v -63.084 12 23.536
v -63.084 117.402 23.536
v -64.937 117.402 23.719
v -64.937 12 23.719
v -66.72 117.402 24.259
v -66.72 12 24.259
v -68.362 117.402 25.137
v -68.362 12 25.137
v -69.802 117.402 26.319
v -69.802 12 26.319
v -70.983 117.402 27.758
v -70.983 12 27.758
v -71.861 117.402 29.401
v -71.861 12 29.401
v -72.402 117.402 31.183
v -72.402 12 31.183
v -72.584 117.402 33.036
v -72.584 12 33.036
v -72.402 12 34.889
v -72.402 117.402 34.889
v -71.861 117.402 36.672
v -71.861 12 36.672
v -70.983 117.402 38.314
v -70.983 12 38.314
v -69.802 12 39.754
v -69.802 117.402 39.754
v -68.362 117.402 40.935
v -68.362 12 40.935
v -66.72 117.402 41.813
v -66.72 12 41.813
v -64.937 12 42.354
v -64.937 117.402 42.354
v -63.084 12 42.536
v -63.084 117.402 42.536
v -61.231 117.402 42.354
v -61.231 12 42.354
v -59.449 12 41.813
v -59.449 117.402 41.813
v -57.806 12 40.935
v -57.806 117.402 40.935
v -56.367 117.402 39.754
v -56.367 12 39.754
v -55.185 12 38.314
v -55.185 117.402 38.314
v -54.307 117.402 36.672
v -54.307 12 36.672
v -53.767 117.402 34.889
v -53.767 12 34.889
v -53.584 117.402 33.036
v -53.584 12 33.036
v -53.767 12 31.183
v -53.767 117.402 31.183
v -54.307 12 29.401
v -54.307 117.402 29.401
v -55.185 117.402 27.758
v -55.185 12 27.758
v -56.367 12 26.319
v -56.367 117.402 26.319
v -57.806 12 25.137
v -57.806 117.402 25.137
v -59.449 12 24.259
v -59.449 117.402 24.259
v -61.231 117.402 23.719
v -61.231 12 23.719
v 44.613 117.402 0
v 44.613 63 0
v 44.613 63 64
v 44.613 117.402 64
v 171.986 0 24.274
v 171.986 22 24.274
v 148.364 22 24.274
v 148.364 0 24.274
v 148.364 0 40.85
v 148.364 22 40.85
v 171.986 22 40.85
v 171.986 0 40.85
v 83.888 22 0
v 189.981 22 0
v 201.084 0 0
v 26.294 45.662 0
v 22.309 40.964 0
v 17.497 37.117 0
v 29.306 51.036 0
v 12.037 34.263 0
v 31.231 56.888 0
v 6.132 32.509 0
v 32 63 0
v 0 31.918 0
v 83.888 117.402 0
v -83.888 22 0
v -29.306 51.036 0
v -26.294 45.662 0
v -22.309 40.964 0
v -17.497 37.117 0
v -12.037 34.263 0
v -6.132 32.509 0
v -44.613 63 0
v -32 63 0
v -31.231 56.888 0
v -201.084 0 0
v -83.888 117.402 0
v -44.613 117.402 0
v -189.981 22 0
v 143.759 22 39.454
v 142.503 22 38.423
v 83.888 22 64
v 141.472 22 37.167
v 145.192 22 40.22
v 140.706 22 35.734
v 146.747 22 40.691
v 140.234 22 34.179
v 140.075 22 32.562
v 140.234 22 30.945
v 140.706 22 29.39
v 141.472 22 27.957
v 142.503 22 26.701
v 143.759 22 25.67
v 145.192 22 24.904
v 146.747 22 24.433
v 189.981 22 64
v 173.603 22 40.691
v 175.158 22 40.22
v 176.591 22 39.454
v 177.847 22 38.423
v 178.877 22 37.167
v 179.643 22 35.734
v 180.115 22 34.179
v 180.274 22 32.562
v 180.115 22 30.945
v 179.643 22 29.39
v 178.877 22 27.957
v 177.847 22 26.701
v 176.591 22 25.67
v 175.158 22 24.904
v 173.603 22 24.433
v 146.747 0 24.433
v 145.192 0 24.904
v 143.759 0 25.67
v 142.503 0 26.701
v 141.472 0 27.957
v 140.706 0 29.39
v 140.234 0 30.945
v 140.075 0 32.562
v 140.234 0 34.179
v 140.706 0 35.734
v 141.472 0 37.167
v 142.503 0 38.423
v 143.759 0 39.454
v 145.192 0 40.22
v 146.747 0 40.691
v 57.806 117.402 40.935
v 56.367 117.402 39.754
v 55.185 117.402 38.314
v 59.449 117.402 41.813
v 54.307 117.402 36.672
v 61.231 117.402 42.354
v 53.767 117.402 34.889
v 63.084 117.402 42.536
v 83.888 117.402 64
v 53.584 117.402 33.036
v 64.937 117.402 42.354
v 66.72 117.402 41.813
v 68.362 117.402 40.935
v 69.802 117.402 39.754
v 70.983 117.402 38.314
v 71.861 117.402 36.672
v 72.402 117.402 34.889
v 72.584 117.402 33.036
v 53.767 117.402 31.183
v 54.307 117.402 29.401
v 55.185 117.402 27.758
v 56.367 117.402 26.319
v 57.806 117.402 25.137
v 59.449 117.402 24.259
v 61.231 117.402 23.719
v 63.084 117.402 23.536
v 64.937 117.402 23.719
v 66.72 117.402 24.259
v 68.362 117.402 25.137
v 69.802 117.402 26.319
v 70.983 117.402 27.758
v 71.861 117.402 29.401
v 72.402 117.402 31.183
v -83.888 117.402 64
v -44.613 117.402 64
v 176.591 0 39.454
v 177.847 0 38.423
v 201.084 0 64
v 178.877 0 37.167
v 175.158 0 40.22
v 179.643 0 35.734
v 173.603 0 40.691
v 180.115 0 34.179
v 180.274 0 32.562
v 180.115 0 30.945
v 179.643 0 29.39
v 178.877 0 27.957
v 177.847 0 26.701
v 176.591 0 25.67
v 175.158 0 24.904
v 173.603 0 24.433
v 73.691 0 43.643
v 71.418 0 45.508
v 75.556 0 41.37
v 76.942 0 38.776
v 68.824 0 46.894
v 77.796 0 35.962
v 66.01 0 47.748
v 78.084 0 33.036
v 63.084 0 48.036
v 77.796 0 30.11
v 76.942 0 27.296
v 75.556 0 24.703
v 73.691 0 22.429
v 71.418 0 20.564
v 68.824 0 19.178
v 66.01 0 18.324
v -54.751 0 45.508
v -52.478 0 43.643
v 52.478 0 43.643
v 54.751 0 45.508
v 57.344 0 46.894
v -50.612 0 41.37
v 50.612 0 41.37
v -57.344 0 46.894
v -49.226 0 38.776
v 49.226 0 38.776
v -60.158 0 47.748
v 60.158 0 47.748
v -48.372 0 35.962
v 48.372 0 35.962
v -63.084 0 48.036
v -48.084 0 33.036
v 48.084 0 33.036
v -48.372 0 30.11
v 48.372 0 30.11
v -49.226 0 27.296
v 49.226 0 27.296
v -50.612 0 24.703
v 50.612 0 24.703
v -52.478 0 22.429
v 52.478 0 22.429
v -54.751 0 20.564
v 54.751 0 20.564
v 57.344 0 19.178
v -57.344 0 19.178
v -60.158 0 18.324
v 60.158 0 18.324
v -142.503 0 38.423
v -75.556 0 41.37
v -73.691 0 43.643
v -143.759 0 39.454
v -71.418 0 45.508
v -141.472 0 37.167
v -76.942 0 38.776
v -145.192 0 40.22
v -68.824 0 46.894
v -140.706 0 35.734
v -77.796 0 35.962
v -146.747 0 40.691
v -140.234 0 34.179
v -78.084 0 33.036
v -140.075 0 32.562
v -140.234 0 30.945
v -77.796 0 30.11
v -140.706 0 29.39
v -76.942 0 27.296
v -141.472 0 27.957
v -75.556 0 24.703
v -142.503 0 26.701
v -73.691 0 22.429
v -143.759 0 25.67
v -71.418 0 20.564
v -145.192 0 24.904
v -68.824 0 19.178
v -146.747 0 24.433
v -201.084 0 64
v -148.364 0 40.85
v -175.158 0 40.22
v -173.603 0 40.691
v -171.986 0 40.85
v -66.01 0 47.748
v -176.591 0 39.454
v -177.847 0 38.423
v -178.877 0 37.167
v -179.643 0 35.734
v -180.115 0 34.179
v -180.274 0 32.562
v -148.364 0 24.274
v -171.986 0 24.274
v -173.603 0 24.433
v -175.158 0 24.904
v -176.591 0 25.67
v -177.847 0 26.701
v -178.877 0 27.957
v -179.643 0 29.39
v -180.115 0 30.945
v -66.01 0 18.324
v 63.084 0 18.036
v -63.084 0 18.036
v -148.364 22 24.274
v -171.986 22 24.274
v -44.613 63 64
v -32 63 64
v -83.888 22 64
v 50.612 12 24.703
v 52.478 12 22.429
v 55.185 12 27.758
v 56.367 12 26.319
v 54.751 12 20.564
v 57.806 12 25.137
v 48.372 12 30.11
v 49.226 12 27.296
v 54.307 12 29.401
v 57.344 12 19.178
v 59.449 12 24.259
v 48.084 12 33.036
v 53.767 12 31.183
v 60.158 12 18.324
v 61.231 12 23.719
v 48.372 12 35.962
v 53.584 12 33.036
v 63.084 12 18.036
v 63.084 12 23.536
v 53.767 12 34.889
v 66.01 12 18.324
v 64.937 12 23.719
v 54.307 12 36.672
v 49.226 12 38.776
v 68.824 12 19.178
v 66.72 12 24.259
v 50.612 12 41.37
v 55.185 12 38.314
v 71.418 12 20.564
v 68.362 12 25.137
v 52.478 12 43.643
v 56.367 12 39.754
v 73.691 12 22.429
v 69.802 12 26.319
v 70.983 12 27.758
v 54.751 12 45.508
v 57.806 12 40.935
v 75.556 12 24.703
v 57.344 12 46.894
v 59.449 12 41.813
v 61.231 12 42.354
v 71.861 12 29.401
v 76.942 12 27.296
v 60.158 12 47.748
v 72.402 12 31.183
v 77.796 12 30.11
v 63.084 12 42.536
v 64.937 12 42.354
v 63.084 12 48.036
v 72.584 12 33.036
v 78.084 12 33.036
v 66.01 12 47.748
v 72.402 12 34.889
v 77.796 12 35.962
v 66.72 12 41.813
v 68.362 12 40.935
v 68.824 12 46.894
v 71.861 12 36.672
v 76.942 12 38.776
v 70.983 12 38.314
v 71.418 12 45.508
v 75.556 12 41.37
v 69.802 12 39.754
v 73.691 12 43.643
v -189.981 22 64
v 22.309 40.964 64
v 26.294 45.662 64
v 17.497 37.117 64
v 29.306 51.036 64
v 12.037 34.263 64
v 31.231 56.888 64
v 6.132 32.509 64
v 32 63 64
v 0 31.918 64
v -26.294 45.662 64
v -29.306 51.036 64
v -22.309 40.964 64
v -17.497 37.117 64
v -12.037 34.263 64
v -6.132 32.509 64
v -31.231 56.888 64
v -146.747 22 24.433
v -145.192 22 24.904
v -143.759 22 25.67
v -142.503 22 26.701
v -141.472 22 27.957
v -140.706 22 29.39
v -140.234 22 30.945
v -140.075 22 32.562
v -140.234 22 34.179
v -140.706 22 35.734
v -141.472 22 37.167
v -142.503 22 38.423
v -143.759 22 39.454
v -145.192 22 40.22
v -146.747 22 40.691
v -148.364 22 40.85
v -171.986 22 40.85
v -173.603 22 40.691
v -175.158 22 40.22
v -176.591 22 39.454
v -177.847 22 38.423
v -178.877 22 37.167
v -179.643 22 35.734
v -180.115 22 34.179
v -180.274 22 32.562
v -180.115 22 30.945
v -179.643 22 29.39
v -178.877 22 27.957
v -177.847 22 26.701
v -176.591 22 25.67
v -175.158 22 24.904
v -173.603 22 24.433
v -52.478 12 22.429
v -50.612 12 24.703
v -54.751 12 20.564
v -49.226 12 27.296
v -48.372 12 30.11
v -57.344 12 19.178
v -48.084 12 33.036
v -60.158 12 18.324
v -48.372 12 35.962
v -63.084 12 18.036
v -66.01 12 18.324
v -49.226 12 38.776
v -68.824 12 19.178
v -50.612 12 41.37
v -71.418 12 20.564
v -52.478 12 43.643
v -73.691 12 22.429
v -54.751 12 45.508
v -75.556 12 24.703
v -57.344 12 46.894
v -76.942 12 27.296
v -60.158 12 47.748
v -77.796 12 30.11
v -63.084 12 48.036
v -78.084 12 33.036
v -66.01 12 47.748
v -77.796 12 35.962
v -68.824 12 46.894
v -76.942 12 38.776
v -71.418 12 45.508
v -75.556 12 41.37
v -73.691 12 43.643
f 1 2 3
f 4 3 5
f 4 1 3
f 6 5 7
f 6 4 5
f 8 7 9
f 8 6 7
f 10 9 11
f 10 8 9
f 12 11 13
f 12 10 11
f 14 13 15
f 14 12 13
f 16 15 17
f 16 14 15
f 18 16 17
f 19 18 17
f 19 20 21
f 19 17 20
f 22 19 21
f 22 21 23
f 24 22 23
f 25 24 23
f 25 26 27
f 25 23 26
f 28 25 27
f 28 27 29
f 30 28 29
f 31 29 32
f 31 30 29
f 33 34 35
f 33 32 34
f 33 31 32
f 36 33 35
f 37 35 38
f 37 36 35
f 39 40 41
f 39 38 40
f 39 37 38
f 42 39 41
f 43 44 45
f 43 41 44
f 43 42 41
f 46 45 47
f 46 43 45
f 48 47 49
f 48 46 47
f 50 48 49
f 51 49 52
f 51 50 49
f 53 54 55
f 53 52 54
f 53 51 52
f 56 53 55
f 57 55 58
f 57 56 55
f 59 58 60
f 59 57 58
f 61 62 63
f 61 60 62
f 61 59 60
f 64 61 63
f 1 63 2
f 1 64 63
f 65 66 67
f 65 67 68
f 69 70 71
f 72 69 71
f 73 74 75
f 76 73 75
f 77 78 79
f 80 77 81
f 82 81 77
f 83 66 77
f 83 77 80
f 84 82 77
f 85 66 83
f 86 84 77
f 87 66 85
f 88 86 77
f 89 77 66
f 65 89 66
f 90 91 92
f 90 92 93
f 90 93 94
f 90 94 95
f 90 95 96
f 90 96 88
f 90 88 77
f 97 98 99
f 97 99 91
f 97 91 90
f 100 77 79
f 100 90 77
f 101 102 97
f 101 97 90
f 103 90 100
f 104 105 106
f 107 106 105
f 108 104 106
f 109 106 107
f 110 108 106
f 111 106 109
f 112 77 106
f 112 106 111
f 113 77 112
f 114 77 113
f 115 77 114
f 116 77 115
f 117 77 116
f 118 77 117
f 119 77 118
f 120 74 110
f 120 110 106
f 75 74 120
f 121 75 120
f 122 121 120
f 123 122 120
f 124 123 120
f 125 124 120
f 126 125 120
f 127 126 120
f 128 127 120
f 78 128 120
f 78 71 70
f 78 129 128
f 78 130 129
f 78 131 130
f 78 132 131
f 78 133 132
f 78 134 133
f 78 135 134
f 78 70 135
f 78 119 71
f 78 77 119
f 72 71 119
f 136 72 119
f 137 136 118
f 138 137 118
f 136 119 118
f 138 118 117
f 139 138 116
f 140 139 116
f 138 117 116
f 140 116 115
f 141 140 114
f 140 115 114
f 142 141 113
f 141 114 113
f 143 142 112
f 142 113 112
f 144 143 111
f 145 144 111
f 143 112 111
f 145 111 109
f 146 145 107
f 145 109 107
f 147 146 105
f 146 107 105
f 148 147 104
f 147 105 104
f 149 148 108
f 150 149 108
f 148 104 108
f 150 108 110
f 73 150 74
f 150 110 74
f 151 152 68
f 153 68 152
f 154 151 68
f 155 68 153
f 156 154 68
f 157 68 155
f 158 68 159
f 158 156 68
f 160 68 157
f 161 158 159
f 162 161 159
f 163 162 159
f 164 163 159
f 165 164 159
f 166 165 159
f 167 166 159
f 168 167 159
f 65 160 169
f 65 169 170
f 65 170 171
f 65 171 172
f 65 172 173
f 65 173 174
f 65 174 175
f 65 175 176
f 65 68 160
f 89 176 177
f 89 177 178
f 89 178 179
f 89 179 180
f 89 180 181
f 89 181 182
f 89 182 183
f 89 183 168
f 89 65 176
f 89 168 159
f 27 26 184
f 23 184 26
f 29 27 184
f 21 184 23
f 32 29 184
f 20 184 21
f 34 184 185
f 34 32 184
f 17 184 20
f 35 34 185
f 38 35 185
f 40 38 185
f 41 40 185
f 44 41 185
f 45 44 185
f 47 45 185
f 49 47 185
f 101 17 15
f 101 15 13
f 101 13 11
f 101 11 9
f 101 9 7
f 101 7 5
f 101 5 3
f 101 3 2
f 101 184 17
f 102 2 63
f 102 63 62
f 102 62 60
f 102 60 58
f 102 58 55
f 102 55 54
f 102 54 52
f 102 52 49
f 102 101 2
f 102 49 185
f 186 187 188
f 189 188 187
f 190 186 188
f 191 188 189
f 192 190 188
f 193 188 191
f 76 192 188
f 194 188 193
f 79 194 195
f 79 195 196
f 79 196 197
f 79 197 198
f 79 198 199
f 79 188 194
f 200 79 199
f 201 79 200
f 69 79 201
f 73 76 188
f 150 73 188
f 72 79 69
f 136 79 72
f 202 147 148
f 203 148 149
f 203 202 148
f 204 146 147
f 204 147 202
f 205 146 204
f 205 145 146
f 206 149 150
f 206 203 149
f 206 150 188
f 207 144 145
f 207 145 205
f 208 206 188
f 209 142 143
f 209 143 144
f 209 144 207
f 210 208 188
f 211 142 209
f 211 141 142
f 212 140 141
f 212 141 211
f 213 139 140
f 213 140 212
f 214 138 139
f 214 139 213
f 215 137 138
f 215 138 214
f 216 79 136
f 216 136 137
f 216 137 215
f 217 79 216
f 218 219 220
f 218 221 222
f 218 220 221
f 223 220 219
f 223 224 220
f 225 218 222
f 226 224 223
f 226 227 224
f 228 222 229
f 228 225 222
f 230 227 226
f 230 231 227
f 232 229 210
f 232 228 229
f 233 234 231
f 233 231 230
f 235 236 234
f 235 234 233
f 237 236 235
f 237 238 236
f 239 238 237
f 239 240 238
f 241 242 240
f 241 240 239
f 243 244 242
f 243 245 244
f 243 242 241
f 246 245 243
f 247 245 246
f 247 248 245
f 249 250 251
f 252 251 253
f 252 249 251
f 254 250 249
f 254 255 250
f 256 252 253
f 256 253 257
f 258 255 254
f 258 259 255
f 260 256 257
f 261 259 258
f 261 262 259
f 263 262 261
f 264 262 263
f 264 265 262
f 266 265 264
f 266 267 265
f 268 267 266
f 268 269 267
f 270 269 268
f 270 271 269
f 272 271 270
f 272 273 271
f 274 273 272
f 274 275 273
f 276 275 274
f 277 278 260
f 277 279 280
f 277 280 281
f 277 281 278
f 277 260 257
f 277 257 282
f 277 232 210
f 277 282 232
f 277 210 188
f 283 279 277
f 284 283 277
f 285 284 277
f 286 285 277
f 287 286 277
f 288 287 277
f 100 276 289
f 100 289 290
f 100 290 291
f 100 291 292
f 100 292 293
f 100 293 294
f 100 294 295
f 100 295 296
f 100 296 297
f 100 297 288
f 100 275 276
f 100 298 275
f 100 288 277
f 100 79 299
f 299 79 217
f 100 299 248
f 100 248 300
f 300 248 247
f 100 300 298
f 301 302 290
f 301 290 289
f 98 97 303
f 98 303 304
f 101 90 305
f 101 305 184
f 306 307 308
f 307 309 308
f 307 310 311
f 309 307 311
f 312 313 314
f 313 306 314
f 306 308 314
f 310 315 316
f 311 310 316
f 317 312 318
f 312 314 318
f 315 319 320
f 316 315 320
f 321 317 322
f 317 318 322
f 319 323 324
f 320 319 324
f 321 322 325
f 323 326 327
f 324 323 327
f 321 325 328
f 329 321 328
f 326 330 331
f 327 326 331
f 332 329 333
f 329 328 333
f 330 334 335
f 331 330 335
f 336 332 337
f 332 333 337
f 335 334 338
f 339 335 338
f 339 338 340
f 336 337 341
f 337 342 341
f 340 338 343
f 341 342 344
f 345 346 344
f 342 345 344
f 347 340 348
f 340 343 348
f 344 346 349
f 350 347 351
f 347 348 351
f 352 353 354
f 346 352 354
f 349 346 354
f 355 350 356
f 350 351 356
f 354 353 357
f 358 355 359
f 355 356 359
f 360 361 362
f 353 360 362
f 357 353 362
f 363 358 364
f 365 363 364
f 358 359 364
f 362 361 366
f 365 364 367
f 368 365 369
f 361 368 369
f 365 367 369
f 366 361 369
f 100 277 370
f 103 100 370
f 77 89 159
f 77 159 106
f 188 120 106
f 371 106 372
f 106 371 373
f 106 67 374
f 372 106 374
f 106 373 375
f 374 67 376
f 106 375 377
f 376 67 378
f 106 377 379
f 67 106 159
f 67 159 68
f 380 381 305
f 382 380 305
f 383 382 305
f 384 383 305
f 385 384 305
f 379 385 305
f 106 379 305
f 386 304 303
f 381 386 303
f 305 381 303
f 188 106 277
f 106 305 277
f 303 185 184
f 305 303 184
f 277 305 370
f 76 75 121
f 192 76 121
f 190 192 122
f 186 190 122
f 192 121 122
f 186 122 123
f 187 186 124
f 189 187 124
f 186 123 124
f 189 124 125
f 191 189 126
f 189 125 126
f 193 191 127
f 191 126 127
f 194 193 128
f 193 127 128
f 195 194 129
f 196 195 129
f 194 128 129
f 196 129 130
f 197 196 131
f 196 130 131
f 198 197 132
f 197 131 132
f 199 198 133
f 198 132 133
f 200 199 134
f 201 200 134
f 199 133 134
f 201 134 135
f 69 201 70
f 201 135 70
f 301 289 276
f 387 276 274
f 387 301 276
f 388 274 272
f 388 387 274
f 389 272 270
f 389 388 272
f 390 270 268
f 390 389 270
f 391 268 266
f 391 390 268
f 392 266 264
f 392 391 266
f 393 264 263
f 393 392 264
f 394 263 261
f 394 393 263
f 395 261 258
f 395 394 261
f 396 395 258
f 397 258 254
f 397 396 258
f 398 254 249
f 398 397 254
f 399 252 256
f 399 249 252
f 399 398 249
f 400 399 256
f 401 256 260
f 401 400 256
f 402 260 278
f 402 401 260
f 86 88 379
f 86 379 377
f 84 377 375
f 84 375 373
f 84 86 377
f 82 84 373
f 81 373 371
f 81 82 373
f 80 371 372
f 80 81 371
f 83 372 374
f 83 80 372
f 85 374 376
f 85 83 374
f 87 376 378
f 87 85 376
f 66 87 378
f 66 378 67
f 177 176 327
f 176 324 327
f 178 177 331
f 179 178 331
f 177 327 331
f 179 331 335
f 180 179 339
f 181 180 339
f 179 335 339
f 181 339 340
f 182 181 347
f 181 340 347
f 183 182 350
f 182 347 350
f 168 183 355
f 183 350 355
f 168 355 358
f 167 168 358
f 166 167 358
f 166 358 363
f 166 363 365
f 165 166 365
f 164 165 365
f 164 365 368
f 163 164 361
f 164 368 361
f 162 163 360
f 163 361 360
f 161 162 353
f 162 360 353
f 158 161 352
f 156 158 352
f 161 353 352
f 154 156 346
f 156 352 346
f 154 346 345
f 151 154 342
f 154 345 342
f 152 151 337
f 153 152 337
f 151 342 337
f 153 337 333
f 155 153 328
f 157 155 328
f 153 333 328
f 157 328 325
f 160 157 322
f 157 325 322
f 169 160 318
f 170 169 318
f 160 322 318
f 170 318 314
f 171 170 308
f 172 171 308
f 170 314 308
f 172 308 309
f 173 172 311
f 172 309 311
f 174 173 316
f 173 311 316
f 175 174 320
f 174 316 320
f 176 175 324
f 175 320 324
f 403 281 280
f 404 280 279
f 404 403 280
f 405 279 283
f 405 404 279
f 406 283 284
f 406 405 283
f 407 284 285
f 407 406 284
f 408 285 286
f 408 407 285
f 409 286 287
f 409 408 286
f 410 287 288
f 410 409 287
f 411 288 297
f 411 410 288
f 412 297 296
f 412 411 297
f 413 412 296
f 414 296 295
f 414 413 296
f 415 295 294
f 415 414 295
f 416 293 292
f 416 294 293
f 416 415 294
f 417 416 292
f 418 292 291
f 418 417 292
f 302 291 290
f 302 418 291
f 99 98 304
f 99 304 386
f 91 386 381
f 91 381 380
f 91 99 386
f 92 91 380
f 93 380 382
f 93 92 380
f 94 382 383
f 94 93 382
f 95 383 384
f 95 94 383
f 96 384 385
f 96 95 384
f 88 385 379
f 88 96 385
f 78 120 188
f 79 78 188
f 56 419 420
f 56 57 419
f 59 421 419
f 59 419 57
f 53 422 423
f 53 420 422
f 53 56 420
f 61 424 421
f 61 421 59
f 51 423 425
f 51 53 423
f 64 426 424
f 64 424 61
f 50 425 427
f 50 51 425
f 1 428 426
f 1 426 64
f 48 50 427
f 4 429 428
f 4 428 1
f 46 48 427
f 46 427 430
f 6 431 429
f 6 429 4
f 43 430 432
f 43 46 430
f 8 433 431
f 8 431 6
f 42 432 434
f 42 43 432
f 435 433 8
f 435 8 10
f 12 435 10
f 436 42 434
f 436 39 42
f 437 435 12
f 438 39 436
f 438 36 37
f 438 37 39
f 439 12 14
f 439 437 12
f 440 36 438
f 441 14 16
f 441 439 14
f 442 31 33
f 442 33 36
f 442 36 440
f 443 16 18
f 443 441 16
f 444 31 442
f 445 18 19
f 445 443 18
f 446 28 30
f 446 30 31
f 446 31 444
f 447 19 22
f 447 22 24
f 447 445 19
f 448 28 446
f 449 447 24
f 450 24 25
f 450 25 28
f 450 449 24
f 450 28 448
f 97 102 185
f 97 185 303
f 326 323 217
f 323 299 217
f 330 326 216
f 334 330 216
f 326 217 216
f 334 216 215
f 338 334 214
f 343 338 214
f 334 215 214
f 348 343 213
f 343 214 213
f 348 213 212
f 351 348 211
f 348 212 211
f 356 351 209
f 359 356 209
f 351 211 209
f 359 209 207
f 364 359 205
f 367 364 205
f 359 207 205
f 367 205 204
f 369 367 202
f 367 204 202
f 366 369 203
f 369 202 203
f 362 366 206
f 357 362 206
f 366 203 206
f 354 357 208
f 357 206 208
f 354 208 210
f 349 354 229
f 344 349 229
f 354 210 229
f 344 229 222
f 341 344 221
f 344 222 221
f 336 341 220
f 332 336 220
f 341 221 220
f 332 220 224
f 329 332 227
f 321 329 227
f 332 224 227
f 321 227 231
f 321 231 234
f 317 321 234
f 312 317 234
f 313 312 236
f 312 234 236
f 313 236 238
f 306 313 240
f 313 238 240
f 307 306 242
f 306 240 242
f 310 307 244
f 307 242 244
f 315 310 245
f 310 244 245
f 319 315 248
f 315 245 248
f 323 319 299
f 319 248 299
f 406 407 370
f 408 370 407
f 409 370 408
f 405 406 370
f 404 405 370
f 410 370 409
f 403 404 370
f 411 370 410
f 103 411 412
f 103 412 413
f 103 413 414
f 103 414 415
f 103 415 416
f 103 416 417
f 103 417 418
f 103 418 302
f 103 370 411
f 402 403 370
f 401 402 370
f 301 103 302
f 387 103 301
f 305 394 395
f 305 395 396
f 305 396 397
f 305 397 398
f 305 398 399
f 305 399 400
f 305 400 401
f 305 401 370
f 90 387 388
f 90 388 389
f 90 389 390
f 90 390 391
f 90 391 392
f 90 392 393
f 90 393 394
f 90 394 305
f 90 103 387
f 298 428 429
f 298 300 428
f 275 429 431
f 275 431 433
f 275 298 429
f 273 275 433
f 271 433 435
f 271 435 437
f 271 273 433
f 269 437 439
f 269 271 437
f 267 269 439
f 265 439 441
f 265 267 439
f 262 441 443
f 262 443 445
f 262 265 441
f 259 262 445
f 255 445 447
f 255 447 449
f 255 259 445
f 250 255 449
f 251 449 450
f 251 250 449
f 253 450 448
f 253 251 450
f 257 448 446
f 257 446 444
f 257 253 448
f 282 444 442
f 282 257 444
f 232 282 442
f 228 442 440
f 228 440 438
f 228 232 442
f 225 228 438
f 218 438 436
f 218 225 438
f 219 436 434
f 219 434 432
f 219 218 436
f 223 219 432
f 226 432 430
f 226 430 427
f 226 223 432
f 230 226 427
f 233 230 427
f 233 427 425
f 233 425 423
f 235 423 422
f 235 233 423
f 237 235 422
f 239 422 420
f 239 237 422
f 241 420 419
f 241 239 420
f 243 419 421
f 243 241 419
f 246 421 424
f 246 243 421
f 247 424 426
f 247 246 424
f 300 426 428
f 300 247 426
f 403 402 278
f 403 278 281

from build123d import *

# Parameters (mm, degrees)
BOSS_EXTRUDE1_DEPTH = 64
CUT_EXTRUDE1_DEPTH  = 64


with BuildPart() as part:
    # Sketch1 → Boss-Extrude1 (new body)
    with BuildSketch(Plane.XY):
        with BuildLine():
            Line((-201.08411215, 0), (-189.981308411, 22))
            Line((-189.981308411, 22), (-83.887850467, 22))
            Line((-83.887850467, 22), (-83.887850467, 117.401869159))
            Line((-83.887850467, 117.401869159), (-44.613332129, 117.401869159))
            Line((-44.613332129, 117.401869159), (-44.613332129, 63))
            Line((-44.613332129, 63), (-32, 63))
            ThreePointArc((-32, 63), (-22.308799202, 40.963993281), (0, 31.918417389))
            ThreePointArc((0, 31.918417389), (22.308799202, 40.963993281), (32, 63))
            Line((32, 63), (44.613332129, 63))
            Line((44.613332129, 63), (44.613332129, 117.401869159))
            Line((44.613332129, 117.401869159), (83.887850467, 117.401869159))
            Line((83.887850467, 117.401869159), (83.887850467, 22))
            Line((83.887850467, 22), (189.981308411, 22))
            Line((189.981308411, 22), (201.08411215, 0))
            Line((201.08411215, 0), (-201.08411215, 0))
        make_face()
    extrude(amount=BOSS_EXTRUDE1_DEPTH)

    # Sketch2 → Cut-Extrude1 (cut)
    with BuildSketch(Plane(origin=(0, 22, 0), x_dir=(1, 0, 0), z_dir=(0, 1, 0))):
        with BuildLine():
            Line((-171.985857657, -24.273514292), (-148.363703714, -24.273514292))
            ThreePointArc((-148.363703714, -24.273514292), (-140.075228646, -32.56198936), (-148.363703714, -40.850464428))
            Line((-148.363703714, -40.850464428), (-171.985857657, -40.850464428))
            ThreePointArc((-171.985857657, -40.850464428), (-180.274332725, -32.56198936), (-171.985857657, -24.273514292))
        make_face()
    cut_extrude1 = extrude(amount=-CUT_EXTRUDE1_DEPTH, mode=Mode.SUBTRACT)

    # Sketch5 → CBORE for M5 Hex Head Bolt1 (revolve, cut)
    with BuildSketch(Plane(origin=(-63.08411215, 0, 33.036059383), x_dir=(0, 0, -1), z_dir=(1, 0, 0))):
        Polygon((0, 0), (0, 135.708175881), (9.5, 130), (9.5, 12), (15, 12), (15, 0), align=None)
    cbore_for_m5_hex_head_bolt1 = revolve(axis=Axis((-63.08411215, -6.35, 33.036059383), (0, 1, 0)), mode=Mode.SUBTRACT)

    # Mirror1: Cut-Extrude1, CBORE for M5 Hex Head Bolt1 across plane
    add(cut_extrude1.mirror(Plane(origin=(0, 0, 0), x_dir=(0, 0, 1), z_dir=(1, 0, 0))), mode=Mode.SUBTRACT)
    add(cbore_for_m5_hex_head_bolt1.mirror(Plane(origin=(0, 0, 0), x_dir=(0, 0, 1), z_dir=(1, 0, 0))), mode=Mode.SUBTRACT)


solid = part.part
